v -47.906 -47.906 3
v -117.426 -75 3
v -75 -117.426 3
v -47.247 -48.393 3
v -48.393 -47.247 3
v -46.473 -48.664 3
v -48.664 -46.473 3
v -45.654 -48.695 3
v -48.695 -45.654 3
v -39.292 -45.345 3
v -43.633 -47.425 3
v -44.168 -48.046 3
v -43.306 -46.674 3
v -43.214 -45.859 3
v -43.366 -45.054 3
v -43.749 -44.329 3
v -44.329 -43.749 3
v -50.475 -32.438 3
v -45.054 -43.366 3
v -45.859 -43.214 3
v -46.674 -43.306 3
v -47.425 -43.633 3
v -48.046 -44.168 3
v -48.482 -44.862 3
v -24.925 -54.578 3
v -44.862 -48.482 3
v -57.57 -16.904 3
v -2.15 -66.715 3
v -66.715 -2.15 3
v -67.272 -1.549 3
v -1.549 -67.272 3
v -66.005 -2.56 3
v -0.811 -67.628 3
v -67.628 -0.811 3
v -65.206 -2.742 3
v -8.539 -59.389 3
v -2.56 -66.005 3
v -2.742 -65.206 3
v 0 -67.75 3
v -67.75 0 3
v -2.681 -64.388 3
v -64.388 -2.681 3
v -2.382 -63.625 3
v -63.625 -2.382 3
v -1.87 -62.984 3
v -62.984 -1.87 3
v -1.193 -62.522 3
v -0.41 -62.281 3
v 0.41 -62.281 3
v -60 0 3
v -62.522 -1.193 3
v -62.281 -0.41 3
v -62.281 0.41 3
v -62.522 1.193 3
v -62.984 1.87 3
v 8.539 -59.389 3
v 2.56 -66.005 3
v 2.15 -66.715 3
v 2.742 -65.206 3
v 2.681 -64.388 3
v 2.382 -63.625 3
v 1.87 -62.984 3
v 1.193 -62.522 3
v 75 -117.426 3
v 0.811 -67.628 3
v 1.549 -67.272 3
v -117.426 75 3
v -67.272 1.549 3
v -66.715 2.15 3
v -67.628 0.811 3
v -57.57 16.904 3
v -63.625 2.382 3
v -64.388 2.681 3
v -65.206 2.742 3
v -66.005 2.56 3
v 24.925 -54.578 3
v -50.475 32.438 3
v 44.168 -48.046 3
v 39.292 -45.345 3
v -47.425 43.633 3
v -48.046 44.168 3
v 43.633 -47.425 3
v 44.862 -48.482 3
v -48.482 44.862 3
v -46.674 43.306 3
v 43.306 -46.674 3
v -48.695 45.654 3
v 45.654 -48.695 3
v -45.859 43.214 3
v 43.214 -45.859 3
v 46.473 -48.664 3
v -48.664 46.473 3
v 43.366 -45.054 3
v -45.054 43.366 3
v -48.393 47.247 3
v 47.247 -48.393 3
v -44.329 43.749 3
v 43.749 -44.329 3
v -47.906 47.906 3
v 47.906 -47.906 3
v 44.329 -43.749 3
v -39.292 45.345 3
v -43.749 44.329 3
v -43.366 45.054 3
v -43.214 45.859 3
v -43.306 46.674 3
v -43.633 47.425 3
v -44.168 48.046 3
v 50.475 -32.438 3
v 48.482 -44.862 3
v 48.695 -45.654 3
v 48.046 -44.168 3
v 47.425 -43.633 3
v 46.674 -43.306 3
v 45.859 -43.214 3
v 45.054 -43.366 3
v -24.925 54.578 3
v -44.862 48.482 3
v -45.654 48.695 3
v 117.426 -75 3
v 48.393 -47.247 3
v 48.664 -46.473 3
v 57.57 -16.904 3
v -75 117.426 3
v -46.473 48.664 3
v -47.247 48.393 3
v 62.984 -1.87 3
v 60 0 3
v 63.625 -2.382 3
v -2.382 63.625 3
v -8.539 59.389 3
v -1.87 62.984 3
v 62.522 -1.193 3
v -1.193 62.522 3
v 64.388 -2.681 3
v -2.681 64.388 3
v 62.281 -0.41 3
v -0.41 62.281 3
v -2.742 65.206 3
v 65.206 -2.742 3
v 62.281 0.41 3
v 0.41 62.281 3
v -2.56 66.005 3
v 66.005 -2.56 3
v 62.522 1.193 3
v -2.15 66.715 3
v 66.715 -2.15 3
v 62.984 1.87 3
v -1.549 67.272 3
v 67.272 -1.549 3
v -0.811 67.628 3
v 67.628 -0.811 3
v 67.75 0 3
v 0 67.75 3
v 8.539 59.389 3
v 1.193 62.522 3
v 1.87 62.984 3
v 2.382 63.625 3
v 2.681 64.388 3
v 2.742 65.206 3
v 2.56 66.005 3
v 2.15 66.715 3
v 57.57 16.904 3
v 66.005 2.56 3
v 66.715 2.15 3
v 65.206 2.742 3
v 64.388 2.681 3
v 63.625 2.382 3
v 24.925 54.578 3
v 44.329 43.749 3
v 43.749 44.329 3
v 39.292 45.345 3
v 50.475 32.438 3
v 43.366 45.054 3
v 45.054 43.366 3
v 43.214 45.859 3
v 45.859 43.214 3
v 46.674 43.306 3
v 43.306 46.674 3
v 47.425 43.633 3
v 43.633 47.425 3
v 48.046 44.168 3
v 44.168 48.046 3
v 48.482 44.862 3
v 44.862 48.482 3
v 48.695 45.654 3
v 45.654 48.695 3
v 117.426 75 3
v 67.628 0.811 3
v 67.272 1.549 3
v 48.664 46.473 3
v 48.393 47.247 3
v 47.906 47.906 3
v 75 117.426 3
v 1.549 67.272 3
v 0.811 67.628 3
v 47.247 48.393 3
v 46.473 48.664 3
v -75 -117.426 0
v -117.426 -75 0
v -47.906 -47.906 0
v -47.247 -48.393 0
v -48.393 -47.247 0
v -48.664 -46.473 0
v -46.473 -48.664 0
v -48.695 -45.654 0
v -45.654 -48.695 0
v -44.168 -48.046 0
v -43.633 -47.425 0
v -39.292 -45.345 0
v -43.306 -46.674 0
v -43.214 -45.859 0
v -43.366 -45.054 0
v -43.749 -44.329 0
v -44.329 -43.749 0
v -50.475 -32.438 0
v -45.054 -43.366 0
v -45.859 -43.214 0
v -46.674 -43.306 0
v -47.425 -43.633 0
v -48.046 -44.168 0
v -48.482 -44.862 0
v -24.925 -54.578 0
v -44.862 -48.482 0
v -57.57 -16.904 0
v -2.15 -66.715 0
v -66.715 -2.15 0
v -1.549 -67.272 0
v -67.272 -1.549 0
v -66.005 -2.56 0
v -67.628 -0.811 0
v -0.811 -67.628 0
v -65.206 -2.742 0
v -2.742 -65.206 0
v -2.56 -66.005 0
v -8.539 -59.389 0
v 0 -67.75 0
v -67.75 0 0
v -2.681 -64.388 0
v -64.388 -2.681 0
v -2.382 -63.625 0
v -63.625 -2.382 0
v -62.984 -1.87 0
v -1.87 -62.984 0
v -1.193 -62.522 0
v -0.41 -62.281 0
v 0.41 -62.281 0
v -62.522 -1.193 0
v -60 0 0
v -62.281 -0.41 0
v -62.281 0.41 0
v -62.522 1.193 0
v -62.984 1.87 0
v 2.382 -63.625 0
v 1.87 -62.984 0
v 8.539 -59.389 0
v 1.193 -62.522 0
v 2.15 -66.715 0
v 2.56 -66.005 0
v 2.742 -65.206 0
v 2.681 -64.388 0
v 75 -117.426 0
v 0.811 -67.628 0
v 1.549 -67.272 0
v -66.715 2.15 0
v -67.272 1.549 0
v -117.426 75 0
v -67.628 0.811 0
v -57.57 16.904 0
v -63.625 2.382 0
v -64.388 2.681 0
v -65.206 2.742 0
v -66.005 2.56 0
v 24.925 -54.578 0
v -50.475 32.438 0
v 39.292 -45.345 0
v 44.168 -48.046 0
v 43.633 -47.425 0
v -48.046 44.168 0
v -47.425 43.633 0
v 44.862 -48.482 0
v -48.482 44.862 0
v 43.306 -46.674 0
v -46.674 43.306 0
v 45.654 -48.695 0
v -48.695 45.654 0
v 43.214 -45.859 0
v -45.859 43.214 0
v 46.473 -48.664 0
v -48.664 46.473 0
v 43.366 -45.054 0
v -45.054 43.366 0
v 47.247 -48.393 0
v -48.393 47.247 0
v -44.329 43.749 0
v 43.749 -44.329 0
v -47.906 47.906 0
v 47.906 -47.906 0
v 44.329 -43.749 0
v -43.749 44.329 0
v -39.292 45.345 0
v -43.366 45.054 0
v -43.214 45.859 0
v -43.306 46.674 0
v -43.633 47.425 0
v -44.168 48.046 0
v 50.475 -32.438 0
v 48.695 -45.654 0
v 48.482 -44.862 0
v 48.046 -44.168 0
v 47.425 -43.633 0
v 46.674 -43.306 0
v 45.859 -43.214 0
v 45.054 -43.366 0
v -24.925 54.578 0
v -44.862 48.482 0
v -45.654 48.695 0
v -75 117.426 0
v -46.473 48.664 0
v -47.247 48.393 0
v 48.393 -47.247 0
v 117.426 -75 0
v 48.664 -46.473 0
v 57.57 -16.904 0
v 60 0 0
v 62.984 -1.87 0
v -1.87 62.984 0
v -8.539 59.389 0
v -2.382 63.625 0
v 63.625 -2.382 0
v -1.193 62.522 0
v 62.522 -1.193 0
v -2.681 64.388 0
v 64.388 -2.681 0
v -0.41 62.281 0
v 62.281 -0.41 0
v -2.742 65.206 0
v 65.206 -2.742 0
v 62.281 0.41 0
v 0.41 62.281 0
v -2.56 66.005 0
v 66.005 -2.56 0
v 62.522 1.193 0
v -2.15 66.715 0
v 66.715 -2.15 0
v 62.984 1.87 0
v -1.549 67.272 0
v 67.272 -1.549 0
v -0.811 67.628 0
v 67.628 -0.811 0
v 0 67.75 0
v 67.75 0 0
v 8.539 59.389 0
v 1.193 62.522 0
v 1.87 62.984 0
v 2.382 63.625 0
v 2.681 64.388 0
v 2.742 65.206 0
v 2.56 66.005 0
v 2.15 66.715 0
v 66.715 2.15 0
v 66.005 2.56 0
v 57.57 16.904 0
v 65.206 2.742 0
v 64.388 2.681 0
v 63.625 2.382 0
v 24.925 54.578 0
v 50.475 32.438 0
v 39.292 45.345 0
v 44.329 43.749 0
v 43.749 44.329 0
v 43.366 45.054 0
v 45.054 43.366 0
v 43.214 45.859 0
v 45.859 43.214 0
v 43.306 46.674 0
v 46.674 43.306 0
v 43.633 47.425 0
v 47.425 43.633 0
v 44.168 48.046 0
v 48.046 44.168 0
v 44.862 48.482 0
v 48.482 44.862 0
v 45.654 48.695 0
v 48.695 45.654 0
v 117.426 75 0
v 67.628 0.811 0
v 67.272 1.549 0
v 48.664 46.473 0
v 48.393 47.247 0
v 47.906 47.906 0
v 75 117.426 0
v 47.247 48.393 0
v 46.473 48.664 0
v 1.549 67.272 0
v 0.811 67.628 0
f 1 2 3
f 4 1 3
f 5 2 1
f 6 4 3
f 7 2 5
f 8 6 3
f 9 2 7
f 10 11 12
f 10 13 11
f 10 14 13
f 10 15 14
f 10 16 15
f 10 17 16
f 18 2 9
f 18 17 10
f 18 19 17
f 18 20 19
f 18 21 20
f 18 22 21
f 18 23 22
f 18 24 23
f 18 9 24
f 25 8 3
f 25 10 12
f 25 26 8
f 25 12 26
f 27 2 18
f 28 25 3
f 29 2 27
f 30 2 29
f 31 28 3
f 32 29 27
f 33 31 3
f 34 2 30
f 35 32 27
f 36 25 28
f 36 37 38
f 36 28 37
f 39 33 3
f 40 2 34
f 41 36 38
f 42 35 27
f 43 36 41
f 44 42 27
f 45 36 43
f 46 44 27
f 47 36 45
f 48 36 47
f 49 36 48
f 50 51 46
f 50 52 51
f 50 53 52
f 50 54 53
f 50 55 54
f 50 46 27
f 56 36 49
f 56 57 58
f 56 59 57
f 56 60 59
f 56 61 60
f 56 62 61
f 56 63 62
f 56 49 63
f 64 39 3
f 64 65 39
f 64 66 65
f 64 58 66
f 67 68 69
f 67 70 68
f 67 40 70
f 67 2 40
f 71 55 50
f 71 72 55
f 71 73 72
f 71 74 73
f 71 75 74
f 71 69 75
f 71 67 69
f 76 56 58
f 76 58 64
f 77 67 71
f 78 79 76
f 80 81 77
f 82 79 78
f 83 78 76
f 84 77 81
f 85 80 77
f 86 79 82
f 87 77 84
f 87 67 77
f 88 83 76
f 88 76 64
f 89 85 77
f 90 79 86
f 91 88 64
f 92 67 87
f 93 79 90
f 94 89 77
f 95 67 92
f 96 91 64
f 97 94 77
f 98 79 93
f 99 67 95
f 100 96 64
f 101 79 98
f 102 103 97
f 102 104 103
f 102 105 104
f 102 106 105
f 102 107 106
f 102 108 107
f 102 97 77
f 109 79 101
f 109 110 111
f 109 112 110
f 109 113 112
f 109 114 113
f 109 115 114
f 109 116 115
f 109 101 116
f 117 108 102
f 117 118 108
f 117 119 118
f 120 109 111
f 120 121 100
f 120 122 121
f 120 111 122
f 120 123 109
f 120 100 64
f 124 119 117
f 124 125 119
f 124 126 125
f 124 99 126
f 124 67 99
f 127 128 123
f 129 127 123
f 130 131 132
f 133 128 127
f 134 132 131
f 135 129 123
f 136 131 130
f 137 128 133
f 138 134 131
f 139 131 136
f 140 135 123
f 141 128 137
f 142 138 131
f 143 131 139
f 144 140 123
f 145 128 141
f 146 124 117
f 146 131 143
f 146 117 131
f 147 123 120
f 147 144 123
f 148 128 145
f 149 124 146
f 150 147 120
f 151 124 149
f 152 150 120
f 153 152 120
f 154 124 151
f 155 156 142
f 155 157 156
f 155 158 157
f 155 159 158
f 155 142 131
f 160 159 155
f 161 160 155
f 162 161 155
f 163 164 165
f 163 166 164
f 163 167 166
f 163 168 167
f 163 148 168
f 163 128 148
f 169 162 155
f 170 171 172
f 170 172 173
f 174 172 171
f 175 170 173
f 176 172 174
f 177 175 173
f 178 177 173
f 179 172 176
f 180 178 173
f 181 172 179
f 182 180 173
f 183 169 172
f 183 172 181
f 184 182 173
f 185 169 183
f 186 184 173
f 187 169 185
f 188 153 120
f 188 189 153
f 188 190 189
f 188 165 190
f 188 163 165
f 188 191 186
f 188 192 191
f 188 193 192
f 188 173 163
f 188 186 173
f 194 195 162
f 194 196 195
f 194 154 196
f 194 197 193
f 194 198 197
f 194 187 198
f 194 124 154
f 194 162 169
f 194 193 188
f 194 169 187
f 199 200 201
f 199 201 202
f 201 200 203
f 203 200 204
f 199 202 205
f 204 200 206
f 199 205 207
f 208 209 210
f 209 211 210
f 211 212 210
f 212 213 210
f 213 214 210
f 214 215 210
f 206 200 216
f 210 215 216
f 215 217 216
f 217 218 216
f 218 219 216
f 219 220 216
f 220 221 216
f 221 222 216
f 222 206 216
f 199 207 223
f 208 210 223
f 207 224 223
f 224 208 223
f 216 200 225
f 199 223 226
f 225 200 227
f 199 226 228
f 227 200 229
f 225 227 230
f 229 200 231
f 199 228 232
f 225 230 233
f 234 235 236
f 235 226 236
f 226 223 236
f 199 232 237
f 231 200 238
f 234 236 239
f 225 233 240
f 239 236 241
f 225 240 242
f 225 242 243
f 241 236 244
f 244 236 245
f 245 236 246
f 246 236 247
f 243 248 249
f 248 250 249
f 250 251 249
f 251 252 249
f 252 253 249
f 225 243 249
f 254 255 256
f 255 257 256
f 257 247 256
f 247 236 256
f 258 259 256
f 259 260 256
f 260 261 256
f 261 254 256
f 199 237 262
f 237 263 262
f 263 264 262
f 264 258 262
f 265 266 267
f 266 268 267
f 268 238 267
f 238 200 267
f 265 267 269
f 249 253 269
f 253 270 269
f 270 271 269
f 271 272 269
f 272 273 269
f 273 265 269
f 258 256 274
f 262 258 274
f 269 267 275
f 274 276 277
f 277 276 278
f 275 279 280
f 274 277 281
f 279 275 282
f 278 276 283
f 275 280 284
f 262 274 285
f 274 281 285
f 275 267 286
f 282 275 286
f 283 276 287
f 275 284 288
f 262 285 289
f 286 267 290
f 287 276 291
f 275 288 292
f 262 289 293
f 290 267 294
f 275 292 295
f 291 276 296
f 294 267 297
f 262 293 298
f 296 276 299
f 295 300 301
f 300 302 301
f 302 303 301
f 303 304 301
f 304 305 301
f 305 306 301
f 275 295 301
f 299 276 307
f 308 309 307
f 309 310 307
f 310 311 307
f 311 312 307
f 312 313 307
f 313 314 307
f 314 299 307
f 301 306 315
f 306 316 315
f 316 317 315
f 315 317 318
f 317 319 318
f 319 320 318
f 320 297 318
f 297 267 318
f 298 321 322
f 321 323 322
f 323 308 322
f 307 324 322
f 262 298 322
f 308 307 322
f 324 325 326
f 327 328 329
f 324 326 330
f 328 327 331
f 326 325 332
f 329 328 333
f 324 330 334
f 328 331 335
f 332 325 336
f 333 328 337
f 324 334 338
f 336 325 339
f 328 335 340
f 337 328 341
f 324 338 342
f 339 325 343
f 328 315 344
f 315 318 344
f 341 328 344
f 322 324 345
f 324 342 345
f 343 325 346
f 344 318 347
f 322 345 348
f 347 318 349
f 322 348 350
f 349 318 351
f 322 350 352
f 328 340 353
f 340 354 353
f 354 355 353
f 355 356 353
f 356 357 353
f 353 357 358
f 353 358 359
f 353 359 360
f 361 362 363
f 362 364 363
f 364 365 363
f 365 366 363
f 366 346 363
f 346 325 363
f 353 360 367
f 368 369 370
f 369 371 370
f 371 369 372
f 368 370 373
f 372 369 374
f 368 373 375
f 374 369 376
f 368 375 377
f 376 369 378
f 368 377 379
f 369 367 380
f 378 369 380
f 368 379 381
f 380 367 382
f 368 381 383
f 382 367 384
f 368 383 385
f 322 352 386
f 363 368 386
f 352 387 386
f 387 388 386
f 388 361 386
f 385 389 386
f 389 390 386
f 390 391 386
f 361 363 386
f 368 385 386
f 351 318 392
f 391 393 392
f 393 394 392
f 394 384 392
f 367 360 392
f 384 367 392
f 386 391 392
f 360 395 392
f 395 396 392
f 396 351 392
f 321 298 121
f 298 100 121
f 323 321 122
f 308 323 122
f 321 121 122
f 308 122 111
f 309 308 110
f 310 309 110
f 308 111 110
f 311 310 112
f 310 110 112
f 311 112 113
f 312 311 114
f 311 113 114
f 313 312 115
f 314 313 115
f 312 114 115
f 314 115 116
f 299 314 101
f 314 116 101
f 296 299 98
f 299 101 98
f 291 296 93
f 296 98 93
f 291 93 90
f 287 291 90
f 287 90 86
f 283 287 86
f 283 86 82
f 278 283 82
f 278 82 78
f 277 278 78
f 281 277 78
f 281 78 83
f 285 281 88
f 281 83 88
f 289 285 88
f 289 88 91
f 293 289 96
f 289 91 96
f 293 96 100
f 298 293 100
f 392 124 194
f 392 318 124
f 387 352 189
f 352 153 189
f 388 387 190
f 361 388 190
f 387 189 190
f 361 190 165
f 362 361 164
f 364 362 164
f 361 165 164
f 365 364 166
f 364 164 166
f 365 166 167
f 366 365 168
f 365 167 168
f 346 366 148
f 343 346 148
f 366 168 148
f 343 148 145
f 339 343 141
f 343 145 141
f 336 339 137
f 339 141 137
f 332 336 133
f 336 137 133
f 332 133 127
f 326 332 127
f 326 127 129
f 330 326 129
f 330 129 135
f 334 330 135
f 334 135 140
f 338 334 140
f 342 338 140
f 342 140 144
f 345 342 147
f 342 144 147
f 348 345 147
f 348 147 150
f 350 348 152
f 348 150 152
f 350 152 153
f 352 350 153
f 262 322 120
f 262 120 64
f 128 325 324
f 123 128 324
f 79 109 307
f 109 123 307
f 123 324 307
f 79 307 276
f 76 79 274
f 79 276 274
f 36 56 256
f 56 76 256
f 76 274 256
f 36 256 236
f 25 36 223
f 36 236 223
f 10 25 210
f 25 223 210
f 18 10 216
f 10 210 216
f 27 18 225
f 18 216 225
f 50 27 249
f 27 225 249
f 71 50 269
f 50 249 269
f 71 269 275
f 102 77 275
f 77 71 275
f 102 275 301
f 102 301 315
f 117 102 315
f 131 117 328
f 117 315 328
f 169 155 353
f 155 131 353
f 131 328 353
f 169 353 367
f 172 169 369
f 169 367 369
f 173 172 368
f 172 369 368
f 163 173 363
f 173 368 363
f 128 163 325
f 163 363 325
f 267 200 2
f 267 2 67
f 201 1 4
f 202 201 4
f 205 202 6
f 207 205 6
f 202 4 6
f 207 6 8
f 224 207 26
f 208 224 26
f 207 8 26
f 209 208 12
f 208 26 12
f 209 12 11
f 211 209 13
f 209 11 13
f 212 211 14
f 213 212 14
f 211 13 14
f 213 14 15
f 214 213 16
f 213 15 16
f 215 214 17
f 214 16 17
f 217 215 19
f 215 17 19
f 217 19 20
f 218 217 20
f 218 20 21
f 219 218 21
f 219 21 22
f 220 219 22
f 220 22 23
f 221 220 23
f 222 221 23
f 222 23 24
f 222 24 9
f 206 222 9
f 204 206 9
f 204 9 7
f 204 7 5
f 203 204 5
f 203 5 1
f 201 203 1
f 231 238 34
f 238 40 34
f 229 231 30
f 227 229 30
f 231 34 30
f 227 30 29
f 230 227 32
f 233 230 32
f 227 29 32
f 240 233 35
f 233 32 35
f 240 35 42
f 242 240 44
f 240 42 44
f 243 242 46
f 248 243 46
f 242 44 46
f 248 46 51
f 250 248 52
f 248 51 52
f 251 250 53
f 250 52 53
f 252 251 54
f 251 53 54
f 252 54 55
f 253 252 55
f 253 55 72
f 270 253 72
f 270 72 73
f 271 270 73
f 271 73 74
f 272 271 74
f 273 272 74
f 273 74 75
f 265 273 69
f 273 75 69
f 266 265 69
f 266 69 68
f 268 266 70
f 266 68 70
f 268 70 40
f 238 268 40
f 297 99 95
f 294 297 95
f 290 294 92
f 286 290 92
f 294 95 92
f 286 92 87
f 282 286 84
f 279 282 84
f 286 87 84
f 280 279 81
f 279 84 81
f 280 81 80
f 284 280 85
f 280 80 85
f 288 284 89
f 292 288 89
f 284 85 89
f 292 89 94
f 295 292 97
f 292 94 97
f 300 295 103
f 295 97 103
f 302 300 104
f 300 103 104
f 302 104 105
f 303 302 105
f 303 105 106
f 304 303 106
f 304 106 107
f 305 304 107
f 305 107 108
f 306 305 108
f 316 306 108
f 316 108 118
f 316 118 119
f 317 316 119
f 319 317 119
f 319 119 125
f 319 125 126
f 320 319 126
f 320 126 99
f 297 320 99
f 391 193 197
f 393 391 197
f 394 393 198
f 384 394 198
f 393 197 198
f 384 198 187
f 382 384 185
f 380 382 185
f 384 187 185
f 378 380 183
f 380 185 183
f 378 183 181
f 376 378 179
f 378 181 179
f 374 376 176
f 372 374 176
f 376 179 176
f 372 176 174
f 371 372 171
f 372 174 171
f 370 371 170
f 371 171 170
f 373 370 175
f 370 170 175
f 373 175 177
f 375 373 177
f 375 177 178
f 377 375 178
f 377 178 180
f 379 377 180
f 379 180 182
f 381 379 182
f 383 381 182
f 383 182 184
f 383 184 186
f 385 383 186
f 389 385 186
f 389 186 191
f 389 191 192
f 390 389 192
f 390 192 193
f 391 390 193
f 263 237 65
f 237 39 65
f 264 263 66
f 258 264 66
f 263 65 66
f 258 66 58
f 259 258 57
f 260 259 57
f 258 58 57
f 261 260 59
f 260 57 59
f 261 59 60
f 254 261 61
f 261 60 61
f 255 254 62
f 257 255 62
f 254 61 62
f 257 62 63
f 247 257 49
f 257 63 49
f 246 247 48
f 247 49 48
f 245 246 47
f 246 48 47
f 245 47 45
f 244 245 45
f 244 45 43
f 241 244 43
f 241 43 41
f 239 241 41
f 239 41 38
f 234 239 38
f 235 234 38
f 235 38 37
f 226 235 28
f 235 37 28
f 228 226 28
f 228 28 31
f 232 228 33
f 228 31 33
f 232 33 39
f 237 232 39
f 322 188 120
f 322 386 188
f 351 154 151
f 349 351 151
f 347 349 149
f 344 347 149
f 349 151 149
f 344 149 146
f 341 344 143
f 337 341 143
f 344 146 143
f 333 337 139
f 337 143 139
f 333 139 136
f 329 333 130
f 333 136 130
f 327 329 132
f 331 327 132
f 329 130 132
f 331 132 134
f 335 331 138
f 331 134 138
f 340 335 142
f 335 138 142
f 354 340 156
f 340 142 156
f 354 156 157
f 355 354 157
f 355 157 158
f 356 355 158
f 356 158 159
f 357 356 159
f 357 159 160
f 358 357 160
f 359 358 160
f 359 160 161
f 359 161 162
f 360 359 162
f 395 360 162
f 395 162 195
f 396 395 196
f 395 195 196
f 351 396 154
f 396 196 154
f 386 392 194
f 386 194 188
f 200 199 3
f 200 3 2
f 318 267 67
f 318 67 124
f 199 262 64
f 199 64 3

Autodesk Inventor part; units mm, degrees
ref_plane "YZ Plane" through (0, 0, 0) normal (1, 0, 0) x (0, 1, 0)
ref_plane "XZ Plane" through (0, 0, 0) normal (0, 1, 0) x (-1, 0, 0)
ref_plane "XY Plane" through (0, 0, 0) normal (0, 0, 1) x (1, 0, 0)
sketch "Sketch1" plane through (0, 0, 0) normal (0, 0, 1) x (1, 0, 0)
  circle A0 centre (0, 0) radius 60
  line L0 (-117.4264, -75) -> (-117.4264, 75)
  line L1 (-117.4264, 75) -> (-75, 117.4264)
  line L2 (-75, 117.4264) -> (75, 117.4264)
  line L3 (75, 117.4264) -> (117.4264, 75)
  line L4 (117.4264, 75) -> (117.4264, -75)
  line L5 (117.4264, -75) -> (75, -117.4264)
  line L6 (75, -117.4264) -> (-75, -117.4264)
  line L7 (-75, -117.4264) -> (-117.4264, -75)
  point P0 (-117.4264, 0)
  point P1 (117.4264, 0)
  point P2 (0, 117.4264)
  point P3 (0, -117.4264)
  dimension "d2" = 3
  dimension "d22" = 120
  dimension "d33" = 150
  dimension "d35" = 60
extrude "Plate1" add sketch "Sketch1" along normal blind 3
sketch "Sketch6" plane through (0, 0, 3) normal (0, 0, 1) x (1, 0, 0)
  circle A0 centre (0, 0) radius 65 construction
  circle A1 centre (65, 0) radius 2.75
  dimension "d2" = 3
  dimension "d36" = 130
  dimension "d37" = 5.5
extrude "Cut2" cut sketch "Sketch6" against normal blind 3
pattern_circular "Circular Pattern2" count 8 over 360 about axis through (0, 0, -10) along (0, 0, 1) of "Cut2"
equation "\"d2\" = Thickness"
equation "\"d33\" = Wall_1_width"
equation "\"d35\" = Wall_2_width"
equation "\"d38\" = Thickness"
equation "\"BendReliefWidth\" = Thickness"
equation "\"BendReliefDepth\" = 0.5 * Thickness"
equation "\"CornerReliefSize\" = 4 * Thickness"
equation "\"MinimumRemnant\" = 2 * Thickness"
equation "\"TransitionRadius\" = BendRadius"
equation "\"JacobiRadiusSize\" = BendRadius"
equation "\"GapSize\" = Thickness"
equation "\"Thickness\" = 3"
equation "\"Wall_1_width\" = 150"
equation "\"Wall_2_width\" = 60"
equation "\"BendRadius\" = 5"
properties part number "TKS 3555 BOTTOM DS cup" material "Stainless Steel"
